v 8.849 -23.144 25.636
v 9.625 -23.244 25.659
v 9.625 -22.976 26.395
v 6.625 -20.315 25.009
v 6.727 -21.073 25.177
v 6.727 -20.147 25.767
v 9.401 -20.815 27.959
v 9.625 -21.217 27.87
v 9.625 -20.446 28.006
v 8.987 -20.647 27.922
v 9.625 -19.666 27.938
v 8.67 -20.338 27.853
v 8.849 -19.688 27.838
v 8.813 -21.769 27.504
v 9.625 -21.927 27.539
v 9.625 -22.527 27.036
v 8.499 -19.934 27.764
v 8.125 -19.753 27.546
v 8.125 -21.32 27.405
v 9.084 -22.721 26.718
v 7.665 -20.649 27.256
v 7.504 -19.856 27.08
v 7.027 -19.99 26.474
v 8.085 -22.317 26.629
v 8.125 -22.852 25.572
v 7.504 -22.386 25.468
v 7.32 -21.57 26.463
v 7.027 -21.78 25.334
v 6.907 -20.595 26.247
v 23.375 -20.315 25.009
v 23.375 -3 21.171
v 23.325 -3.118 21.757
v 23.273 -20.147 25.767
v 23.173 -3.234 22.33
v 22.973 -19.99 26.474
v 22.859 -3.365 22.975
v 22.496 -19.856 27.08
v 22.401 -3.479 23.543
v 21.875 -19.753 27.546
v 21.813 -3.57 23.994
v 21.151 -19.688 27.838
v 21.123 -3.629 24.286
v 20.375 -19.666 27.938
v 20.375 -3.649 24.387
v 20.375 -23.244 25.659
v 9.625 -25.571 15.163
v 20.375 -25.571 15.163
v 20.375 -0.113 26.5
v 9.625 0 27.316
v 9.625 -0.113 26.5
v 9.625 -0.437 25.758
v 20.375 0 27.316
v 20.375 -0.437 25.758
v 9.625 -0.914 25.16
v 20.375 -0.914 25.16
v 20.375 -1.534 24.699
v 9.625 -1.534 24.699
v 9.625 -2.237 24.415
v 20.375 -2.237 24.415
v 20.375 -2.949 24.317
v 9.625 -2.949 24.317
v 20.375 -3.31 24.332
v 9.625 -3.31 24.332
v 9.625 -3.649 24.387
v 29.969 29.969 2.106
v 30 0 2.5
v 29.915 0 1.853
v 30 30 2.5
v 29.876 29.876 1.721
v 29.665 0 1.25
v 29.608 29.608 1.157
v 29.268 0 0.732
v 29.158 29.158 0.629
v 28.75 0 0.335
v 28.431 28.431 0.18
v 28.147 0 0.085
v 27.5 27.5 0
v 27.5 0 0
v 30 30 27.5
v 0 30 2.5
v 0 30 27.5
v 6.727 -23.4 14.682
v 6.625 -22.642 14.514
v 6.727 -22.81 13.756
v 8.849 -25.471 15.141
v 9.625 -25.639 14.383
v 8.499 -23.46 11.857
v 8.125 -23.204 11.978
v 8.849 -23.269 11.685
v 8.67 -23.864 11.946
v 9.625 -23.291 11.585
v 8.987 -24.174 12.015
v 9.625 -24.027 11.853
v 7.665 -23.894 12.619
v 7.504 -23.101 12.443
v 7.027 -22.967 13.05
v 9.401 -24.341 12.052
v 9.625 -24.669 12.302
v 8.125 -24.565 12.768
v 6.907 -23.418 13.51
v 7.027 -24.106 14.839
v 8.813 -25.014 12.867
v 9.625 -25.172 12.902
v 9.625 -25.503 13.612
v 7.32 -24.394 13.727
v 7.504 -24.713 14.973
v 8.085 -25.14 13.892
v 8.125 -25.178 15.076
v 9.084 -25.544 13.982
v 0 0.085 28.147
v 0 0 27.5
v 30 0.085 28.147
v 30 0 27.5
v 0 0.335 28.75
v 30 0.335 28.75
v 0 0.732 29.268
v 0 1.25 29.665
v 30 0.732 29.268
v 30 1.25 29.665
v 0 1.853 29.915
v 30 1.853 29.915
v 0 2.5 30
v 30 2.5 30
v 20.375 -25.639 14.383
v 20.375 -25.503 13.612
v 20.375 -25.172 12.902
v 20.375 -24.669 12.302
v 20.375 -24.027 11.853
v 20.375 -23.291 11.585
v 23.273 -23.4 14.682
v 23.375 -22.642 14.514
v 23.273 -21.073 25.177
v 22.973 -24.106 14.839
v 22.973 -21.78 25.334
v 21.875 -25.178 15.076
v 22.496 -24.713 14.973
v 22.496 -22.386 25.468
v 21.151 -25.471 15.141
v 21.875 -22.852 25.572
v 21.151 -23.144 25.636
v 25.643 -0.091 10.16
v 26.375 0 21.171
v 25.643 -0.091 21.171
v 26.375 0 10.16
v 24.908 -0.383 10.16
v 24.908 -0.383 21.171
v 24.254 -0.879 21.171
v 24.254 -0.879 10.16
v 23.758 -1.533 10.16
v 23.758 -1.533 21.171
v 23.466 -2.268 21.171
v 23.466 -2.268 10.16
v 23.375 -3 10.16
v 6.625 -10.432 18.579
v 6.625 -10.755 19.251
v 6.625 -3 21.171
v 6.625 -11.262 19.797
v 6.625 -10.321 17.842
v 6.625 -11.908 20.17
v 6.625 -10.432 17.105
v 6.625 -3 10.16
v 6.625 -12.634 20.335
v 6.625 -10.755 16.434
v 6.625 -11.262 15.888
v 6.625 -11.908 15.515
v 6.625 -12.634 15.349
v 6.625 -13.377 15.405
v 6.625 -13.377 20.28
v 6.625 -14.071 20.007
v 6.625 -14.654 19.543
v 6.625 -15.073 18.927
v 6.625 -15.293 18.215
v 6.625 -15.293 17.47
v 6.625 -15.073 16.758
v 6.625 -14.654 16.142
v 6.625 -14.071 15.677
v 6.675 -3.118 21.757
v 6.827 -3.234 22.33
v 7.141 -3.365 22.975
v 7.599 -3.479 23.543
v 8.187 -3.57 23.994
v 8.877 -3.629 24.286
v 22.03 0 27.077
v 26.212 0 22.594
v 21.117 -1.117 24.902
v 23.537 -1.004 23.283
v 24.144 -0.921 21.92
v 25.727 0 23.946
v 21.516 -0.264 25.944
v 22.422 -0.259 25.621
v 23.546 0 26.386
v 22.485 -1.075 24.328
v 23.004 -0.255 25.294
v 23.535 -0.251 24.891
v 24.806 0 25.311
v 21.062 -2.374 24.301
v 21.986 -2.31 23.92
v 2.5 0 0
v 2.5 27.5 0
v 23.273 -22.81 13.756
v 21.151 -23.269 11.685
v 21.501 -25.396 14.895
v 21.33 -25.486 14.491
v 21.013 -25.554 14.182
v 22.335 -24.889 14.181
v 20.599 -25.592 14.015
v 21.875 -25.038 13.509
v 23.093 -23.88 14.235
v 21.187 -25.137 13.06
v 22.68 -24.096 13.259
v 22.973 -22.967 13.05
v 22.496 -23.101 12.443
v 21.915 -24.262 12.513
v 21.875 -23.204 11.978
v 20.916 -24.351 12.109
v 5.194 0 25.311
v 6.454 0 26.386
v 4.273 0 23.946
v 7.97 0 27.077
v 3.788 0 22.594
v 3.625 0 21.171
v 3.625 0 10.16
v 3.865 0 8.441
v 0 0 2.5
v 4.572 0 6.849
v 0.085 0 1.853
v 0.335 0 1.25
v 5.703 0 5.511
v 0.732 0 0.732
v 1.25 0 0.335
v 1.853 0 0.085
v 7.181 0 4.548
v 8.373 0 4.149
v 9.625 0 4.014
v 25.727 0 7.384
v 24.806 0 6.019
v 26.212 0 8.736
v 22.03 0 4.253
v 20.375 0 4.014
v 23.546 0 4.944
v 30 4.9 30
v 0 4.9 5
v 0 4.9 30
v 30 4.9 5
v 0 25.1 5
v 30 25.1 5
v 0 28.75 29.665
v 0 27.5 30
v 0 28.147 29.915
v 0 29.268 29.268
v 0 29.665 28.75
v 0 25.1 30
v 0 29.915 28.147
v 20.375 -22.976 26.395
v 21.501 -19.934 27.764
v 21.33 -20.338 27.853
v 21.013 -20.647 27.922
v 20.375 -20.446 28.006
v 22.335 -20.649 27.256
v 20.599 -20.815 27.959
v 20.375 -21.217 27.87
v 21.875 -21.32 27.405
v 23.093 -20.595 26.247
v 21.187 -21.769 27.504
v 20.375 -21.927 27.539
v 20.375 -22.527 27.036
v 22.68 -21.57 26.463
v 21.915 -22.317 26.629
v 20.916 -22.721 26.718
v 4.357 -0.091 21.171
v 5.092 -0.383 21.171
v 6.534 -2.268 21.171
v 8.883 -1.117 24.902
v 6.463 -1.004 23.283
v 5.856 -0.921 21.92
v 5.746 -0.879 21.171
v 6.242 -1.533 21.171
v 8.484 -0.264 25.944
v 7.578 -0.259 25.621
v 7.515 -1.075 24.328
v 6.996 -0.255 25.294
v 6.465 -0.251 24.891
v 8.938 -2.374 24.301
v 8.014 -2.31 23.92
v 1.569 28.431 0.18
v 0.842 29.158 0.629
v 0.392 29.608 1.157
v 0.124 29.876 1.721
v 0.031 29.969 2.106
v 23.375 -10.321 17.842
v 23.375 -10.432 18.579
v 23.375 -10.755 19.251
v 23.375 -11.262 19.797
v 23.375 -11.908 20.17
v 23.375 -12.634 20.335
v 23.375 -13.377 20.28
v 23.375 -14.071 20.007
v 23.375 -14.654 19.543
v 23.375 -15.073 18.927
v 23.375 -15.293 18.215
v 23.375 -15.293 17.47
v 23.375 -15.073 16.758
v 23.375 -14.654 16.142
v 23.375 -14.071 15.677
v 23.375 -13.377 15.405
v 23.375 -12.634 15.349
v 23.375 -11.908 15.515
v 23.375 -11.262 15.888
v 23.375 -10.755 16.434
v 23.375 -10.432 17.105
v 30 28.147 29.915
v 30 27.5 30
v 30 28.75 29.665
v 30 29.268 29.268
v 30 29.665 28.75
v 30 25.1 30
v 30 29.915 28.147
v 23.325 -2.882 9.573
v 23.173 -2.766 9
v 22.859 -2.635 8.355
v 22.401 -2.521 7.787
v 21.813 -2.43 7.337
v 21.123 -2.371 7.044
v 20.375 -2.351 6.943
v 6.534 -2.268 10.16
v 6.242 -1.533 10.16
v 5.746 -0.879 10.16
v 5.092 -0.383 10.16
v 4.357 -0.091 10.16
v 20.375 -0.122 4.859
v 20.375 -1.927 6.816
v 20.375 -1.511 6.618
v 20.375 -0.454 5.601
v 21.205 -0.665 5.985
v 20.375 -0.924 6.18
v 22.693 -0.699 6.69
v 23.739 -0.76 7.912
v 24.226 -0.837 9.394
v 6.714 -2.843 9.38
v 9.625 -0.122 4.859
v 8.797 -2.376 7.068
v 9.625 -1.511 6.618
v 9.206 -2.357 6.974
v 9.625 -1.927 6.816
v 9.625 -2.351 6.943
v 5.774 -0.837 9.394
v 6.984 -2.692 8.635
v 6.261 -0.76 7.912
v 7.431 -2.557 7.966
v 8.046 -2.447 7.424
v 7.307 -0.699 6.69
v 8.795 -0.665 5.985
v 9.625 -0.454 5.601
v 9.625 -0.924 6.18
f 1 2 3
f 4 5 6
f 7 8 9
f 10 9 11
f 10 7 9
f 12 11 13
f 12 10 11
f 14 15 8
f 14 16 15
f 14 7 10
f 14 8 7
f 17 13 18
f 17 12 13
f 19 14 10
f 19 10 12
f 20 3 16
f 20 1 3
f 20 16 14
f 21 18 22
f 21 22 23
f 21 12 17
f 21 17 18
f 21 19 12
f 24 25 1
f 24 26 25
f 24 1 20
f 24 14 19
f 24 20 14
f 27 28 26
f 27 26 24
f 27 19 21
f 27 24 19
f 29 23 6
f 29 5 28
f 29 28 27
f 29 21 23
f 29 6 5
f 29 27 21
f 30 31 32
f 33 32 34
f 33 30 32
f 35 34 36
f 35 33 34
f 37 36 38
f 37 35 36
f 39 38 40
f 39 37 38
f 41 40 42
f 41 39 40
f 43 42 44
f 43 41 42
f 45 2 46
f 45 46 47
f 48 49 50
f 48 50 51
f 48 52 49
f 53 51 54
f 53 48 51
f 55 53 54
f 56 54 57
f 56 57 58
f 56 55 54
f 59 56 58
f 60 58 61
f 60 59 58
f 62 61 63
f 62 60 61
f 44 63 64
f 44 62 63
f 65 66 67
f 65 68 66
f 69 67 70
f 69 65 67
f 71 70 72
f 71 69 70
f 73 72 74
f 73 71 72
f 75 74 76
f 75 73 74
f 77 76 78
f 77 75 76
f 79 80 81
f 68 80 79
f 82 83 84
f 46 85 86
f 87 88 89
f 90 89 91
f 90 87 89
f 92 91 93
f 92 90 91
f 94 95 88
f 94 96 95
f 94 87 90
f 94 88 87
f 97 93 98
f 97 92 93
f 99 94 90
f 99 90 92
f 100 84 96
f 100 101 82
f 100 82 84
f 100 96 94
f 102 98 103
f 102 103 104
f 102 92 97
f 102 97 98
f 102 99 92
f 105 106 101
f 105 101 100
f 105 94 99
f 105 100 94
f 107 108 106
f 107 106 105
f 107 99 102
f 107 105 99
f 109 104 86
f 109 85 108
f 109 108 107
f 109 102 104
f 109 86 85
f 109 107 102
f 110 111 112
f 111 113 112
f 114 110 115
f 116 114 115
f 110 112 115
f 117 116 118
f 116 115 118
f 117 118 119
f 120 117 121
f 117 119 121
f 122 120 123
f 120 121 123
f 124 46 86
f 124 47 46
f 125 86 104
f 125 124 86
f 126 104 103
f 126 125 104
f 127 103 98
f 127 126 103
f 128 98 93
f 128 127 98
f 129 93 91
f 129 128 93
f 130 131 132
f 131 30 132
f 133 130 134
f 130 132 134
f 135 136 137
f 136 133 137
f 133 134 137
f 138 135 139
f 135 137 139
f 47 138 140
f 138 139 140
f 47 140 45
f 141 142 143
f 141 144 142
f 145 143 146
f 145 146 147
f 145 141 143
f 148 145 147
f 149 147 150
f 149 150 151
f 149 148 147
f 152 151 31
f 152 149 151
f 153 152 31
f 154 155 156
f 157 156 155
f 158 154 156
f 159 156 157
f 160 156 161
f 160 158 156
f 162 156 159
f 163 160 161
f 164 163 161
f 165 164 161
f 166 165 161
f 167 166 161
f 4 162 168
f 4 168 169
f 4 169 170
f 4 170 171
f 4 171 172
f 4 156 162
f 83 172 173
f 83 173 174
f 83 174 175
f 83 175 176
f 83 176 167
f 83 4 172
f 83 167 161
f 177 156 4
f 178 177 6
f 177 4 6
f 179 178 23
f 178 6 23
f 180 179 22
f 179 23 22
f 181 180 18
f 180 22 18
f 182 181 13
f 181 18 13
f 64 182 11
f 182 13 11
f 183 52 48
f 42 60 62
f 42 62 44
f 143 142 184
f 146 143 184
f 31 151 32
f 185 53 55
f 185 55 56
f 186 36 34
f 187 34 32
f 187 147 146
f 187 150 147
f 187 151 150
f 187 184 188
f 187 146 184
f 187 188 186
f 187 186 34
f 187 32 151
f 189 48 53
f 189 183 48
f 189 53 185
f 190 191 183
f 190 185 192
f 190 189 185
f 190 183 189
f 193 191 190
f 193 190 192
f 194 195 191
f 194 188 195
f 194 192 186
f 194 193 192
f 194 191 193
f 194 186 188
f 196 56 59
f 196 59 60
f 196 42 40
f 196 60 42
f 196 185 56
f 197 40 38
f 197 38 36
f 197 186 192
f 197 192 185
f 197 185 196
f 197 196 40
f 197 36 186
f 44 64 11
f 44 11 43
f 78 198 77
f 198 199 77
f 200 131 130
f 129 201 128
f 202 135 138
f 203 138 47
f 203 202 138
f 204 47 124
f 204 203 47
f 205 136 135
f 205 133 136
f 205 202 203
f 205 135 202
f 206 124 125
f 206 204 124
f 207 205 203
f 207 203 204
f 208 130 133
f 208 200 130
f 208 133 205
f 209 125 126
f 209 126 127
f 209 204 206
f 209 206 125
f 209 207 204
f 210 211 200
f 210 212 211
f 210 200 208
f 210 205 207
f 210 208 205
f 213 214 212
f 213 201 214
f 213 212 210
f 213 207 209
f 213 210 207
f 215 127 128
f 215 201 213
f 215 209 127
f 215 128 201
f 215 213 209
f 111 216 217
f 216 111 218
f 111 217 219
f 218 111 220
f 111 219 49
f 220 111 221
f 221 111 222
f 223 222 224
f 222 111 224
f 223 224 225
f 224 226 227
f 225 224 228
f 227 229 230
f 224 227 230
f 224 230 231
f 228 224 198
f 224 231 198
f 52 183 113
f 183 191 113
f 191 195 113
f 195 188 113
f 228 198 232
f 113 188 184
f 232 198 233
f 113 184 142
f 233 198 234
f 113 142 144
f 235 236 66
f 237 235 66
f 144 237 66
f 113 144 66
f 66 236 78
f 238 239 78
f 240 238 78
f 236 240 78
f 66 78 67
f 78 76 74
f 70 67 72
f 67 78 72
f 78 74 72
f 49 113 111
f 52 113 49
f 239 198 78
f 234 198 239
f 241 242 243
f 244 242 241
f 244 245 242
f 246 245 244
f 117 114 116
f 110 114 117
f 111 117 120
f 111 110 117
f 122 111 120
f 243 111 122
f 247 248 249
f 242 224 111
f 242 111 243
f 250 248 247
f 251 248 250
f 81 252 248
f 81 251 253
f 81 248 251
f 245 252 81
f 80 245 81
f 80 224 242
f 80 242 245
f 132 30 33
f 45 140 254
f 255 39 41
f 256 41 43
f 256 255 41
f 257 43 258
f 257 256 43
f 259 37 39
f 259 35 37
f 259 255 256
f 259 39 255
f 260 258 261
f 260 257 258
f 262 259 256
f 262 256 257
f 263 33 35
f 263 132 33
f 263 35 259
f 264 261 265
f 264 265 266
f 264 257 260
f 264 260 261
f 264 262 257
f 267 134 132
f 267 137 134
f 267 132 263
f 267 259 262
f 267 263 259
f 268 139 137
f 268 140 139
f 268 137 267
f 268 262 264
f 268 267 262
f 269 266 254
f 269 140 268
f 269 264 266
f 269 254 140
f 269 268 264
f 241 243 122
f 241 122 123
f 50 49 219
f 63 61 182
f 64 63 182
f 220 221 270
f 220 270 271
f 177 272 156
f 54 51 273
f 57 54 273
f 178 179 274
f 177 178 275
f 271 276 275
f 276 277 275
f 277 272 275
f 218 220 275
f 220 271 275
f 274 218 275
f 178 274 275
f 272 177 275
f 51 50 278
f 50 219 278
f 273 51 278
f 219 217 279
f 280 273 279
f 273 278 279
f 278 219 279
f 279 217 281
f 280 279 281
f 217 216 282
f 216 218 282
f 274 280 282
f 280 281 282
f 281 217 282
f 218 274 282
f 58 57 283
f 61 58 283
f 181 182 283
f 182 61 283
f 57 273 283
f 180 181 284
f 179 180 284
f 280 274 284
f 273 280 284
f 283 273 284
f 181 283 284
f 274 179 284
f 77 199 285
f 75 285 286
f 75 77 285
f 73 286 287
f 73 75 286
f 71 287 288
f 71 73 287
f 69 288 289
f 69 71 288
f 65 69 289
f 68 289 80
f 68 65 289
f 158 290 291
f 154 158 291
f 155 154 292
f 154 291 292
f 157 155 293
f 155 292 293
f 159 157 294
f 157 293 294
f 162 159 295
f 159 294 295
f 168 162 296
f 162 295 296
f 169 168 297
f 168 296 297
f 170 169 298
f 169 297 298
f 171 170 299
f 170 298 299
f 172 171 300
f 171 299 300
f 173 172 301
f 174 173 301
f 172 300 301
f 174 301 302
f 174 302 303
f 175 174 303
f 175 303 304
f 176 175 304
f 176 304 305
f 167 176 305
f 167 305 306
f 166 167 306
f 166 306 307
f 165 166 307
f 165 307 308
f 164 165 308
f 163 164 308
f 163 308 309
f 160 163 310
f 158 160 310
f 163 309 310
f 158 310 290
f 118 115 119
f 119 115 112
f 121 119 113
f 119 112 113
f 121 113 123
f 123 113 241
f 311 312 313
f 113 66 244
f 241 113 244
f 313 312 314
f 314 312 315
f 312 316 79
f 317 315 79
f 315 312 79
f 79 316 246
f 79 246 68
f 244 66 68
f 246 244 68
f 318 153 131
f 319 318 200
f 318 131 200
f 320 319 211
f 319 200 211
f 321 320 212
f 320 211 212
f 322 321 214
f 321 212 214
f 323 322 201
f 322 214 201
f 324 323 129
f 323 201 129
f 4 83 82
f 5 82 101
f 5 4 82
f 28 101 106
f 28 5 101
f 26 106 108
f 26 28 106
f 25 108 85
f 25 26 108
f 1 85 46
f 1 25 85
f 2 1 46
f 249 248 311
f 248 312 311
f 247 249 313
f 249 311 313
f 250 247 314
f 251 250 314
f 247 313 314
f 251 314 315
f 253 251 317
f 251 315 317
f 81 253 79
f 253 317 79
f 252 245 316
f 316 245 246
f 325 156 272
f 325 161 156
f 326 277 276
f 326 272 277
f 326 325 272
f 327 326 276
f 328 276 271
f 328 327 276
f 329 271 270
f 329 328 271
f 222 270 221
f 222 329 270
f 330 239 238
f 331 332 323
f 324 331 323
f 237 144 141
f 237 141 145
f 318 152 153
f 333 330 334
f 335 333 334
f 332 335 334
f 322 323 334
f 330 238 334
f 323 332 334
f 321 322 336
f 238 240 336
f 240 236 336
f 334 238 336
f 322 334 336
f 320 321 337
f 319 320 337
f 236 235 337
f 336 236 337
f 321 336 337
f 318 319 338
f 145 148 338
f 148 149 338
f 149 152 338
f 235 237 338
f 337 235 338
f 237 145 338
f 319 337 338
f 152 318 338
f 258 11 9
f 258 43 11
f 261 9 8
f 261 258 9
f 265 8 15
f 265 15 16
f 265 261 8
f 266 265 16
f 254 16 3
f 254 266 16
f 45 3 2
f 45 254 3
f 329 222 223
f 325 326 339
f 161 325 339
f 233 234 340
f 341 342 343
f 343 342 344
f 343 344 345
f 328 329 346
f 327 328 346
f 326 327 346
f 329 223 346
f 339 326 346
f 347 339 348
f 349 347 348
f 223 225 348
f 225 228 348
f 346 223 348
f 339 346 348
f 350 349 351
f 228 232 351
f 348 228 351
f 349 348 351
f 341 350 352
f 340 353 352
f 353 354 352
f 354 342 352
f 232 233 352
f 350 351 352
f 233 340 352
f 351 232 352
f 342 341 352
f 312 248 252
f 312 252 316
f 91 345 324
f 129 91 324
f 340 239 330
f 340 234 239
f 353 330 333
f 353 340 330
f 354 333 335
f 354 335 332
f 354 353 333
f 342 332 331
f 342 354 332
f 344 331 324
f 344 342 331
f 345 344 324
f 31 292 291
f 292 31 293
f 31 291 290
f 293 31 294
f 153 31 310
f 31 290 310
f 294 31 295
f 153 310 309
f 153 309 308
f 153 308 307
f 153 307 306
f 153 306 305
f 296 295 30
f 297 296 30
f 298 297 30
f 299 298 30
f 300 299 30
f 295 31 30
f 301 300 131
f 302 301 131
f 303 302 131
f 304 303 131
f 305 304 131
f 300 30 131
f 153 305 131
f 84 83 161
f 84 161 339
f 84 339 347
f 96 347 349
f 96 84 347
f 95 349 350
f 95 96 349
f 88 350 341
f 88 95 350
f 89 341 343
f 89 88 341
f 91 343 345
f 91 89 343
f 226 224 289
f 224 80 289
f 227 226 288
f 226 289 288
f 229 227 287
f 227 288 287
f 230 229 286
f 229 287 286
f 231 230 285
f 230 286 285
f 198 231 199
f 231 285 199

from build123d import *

# Parameters (mm, degrees)
F0_W      = 30
F0_H      = 30
F1_DEPTH  = 5
F2_W      = 30
F2_H      = 4.9
F3_DEPTH  = 25
F6_W      = 16.75
F6_H      = 16.75
F7_DEPTH  = 25
F7_FACE_W = 16.75
F7_FACE_H = 8.375
F9_R      = 3
F10_R     = 2.5
F12_R     = 2.5
F13_DEPTH = 16.75


# Not quite as in the source:
# - two fillets or chamfers of one size are made in one step
# - a feature names something its author has since deleted; it is built from what else it names


with BuildPart() as f1:
    # F0 (on Top) → F1 (new body)
    with BuildSketch(Plane.XY):
        with Locations((15, 15)):
            Rectangle(F0_W, F0_H)
    extrude(amount=F1_DEPTH)

    # F2 (on face) → F3 (join)
    with BuildSketch(Plane.XY.offset(5)):
        with Locations((15, 27.55)):
            Rectangle(F2_W, F2_H)
        with Locations((15, 2.45)):
            Rectangle(F2_W, F2_H)
    extrude(amount=F3_DEPTH)

    # F6 (on line) → F7 (join)
    with BuildSketch(Plane(origin=(0, -3.1696369631, 0.7026915972), x_dir=(1, 0, 0), z_dir=(0, -0.9762960071, 0.2164396139))):
        with Locations((15, 14.6444401068)):
            Rectangle(F6_W, F6_H)
    extrude(amount=F7_DEPTH)

    # F7_face (on face) → F8 (join, up to the next surface of F1)
    with BuildSketch(Plane(origin=(15, -0.9063408834, 10.9117604702), x_dir=(1, 0, 0), z_dir=(0, 0.9762960071, -0.2164396139))):
        Rectangle(F7_FACE_W, F7_FACE_H)
    extrude(until=Until.NEXT)

    # F9
    f9_edges = [f1.edges().sort_by_distance(p)[0] for p in [
        (6.625, -24.4074, 20.41099),
        (23.375, 0, 15),
        (23.375, -13.110041, 9.328085),
        (23.375, -24.4074, 20.41099),
        (23.375, -11.297359, 26.082905),
        (15, 0, 23.578341),
        (6.625, 0, 15),
        (15, 0, 6.421659),
        (6.625, -13.110041, 9.328085),
        (15, -26.220082, 12.234511),
        (15, -22.594718, 28.587469),
        (6.625, -11.297359, 26.082905),
    ]]
    fillet(f9_edges, radius=F9_R)

    # F10
    f10_edges = [f1.edges().sort_by_distance(p)[0] for p in [
        (15, 30, 30),
        (15, 0, 30),
        (15, 30, 0),
        (30, 15, 0),
        (0, 15, 0),
    ]]
    fillet(f10_edges, radius=F10_R)

    # F12 (on face) → F13 (cut, through all)
    with BuildSketch(Plane.YZ.offset(23.375)):
        with Locations((-12.8209375408, 17.8423334229)):
            Circle(F12_R)
    extrude(amount=-F13_DEPTH, mode=Mode.SUBTRACT)


solid = f1.part
